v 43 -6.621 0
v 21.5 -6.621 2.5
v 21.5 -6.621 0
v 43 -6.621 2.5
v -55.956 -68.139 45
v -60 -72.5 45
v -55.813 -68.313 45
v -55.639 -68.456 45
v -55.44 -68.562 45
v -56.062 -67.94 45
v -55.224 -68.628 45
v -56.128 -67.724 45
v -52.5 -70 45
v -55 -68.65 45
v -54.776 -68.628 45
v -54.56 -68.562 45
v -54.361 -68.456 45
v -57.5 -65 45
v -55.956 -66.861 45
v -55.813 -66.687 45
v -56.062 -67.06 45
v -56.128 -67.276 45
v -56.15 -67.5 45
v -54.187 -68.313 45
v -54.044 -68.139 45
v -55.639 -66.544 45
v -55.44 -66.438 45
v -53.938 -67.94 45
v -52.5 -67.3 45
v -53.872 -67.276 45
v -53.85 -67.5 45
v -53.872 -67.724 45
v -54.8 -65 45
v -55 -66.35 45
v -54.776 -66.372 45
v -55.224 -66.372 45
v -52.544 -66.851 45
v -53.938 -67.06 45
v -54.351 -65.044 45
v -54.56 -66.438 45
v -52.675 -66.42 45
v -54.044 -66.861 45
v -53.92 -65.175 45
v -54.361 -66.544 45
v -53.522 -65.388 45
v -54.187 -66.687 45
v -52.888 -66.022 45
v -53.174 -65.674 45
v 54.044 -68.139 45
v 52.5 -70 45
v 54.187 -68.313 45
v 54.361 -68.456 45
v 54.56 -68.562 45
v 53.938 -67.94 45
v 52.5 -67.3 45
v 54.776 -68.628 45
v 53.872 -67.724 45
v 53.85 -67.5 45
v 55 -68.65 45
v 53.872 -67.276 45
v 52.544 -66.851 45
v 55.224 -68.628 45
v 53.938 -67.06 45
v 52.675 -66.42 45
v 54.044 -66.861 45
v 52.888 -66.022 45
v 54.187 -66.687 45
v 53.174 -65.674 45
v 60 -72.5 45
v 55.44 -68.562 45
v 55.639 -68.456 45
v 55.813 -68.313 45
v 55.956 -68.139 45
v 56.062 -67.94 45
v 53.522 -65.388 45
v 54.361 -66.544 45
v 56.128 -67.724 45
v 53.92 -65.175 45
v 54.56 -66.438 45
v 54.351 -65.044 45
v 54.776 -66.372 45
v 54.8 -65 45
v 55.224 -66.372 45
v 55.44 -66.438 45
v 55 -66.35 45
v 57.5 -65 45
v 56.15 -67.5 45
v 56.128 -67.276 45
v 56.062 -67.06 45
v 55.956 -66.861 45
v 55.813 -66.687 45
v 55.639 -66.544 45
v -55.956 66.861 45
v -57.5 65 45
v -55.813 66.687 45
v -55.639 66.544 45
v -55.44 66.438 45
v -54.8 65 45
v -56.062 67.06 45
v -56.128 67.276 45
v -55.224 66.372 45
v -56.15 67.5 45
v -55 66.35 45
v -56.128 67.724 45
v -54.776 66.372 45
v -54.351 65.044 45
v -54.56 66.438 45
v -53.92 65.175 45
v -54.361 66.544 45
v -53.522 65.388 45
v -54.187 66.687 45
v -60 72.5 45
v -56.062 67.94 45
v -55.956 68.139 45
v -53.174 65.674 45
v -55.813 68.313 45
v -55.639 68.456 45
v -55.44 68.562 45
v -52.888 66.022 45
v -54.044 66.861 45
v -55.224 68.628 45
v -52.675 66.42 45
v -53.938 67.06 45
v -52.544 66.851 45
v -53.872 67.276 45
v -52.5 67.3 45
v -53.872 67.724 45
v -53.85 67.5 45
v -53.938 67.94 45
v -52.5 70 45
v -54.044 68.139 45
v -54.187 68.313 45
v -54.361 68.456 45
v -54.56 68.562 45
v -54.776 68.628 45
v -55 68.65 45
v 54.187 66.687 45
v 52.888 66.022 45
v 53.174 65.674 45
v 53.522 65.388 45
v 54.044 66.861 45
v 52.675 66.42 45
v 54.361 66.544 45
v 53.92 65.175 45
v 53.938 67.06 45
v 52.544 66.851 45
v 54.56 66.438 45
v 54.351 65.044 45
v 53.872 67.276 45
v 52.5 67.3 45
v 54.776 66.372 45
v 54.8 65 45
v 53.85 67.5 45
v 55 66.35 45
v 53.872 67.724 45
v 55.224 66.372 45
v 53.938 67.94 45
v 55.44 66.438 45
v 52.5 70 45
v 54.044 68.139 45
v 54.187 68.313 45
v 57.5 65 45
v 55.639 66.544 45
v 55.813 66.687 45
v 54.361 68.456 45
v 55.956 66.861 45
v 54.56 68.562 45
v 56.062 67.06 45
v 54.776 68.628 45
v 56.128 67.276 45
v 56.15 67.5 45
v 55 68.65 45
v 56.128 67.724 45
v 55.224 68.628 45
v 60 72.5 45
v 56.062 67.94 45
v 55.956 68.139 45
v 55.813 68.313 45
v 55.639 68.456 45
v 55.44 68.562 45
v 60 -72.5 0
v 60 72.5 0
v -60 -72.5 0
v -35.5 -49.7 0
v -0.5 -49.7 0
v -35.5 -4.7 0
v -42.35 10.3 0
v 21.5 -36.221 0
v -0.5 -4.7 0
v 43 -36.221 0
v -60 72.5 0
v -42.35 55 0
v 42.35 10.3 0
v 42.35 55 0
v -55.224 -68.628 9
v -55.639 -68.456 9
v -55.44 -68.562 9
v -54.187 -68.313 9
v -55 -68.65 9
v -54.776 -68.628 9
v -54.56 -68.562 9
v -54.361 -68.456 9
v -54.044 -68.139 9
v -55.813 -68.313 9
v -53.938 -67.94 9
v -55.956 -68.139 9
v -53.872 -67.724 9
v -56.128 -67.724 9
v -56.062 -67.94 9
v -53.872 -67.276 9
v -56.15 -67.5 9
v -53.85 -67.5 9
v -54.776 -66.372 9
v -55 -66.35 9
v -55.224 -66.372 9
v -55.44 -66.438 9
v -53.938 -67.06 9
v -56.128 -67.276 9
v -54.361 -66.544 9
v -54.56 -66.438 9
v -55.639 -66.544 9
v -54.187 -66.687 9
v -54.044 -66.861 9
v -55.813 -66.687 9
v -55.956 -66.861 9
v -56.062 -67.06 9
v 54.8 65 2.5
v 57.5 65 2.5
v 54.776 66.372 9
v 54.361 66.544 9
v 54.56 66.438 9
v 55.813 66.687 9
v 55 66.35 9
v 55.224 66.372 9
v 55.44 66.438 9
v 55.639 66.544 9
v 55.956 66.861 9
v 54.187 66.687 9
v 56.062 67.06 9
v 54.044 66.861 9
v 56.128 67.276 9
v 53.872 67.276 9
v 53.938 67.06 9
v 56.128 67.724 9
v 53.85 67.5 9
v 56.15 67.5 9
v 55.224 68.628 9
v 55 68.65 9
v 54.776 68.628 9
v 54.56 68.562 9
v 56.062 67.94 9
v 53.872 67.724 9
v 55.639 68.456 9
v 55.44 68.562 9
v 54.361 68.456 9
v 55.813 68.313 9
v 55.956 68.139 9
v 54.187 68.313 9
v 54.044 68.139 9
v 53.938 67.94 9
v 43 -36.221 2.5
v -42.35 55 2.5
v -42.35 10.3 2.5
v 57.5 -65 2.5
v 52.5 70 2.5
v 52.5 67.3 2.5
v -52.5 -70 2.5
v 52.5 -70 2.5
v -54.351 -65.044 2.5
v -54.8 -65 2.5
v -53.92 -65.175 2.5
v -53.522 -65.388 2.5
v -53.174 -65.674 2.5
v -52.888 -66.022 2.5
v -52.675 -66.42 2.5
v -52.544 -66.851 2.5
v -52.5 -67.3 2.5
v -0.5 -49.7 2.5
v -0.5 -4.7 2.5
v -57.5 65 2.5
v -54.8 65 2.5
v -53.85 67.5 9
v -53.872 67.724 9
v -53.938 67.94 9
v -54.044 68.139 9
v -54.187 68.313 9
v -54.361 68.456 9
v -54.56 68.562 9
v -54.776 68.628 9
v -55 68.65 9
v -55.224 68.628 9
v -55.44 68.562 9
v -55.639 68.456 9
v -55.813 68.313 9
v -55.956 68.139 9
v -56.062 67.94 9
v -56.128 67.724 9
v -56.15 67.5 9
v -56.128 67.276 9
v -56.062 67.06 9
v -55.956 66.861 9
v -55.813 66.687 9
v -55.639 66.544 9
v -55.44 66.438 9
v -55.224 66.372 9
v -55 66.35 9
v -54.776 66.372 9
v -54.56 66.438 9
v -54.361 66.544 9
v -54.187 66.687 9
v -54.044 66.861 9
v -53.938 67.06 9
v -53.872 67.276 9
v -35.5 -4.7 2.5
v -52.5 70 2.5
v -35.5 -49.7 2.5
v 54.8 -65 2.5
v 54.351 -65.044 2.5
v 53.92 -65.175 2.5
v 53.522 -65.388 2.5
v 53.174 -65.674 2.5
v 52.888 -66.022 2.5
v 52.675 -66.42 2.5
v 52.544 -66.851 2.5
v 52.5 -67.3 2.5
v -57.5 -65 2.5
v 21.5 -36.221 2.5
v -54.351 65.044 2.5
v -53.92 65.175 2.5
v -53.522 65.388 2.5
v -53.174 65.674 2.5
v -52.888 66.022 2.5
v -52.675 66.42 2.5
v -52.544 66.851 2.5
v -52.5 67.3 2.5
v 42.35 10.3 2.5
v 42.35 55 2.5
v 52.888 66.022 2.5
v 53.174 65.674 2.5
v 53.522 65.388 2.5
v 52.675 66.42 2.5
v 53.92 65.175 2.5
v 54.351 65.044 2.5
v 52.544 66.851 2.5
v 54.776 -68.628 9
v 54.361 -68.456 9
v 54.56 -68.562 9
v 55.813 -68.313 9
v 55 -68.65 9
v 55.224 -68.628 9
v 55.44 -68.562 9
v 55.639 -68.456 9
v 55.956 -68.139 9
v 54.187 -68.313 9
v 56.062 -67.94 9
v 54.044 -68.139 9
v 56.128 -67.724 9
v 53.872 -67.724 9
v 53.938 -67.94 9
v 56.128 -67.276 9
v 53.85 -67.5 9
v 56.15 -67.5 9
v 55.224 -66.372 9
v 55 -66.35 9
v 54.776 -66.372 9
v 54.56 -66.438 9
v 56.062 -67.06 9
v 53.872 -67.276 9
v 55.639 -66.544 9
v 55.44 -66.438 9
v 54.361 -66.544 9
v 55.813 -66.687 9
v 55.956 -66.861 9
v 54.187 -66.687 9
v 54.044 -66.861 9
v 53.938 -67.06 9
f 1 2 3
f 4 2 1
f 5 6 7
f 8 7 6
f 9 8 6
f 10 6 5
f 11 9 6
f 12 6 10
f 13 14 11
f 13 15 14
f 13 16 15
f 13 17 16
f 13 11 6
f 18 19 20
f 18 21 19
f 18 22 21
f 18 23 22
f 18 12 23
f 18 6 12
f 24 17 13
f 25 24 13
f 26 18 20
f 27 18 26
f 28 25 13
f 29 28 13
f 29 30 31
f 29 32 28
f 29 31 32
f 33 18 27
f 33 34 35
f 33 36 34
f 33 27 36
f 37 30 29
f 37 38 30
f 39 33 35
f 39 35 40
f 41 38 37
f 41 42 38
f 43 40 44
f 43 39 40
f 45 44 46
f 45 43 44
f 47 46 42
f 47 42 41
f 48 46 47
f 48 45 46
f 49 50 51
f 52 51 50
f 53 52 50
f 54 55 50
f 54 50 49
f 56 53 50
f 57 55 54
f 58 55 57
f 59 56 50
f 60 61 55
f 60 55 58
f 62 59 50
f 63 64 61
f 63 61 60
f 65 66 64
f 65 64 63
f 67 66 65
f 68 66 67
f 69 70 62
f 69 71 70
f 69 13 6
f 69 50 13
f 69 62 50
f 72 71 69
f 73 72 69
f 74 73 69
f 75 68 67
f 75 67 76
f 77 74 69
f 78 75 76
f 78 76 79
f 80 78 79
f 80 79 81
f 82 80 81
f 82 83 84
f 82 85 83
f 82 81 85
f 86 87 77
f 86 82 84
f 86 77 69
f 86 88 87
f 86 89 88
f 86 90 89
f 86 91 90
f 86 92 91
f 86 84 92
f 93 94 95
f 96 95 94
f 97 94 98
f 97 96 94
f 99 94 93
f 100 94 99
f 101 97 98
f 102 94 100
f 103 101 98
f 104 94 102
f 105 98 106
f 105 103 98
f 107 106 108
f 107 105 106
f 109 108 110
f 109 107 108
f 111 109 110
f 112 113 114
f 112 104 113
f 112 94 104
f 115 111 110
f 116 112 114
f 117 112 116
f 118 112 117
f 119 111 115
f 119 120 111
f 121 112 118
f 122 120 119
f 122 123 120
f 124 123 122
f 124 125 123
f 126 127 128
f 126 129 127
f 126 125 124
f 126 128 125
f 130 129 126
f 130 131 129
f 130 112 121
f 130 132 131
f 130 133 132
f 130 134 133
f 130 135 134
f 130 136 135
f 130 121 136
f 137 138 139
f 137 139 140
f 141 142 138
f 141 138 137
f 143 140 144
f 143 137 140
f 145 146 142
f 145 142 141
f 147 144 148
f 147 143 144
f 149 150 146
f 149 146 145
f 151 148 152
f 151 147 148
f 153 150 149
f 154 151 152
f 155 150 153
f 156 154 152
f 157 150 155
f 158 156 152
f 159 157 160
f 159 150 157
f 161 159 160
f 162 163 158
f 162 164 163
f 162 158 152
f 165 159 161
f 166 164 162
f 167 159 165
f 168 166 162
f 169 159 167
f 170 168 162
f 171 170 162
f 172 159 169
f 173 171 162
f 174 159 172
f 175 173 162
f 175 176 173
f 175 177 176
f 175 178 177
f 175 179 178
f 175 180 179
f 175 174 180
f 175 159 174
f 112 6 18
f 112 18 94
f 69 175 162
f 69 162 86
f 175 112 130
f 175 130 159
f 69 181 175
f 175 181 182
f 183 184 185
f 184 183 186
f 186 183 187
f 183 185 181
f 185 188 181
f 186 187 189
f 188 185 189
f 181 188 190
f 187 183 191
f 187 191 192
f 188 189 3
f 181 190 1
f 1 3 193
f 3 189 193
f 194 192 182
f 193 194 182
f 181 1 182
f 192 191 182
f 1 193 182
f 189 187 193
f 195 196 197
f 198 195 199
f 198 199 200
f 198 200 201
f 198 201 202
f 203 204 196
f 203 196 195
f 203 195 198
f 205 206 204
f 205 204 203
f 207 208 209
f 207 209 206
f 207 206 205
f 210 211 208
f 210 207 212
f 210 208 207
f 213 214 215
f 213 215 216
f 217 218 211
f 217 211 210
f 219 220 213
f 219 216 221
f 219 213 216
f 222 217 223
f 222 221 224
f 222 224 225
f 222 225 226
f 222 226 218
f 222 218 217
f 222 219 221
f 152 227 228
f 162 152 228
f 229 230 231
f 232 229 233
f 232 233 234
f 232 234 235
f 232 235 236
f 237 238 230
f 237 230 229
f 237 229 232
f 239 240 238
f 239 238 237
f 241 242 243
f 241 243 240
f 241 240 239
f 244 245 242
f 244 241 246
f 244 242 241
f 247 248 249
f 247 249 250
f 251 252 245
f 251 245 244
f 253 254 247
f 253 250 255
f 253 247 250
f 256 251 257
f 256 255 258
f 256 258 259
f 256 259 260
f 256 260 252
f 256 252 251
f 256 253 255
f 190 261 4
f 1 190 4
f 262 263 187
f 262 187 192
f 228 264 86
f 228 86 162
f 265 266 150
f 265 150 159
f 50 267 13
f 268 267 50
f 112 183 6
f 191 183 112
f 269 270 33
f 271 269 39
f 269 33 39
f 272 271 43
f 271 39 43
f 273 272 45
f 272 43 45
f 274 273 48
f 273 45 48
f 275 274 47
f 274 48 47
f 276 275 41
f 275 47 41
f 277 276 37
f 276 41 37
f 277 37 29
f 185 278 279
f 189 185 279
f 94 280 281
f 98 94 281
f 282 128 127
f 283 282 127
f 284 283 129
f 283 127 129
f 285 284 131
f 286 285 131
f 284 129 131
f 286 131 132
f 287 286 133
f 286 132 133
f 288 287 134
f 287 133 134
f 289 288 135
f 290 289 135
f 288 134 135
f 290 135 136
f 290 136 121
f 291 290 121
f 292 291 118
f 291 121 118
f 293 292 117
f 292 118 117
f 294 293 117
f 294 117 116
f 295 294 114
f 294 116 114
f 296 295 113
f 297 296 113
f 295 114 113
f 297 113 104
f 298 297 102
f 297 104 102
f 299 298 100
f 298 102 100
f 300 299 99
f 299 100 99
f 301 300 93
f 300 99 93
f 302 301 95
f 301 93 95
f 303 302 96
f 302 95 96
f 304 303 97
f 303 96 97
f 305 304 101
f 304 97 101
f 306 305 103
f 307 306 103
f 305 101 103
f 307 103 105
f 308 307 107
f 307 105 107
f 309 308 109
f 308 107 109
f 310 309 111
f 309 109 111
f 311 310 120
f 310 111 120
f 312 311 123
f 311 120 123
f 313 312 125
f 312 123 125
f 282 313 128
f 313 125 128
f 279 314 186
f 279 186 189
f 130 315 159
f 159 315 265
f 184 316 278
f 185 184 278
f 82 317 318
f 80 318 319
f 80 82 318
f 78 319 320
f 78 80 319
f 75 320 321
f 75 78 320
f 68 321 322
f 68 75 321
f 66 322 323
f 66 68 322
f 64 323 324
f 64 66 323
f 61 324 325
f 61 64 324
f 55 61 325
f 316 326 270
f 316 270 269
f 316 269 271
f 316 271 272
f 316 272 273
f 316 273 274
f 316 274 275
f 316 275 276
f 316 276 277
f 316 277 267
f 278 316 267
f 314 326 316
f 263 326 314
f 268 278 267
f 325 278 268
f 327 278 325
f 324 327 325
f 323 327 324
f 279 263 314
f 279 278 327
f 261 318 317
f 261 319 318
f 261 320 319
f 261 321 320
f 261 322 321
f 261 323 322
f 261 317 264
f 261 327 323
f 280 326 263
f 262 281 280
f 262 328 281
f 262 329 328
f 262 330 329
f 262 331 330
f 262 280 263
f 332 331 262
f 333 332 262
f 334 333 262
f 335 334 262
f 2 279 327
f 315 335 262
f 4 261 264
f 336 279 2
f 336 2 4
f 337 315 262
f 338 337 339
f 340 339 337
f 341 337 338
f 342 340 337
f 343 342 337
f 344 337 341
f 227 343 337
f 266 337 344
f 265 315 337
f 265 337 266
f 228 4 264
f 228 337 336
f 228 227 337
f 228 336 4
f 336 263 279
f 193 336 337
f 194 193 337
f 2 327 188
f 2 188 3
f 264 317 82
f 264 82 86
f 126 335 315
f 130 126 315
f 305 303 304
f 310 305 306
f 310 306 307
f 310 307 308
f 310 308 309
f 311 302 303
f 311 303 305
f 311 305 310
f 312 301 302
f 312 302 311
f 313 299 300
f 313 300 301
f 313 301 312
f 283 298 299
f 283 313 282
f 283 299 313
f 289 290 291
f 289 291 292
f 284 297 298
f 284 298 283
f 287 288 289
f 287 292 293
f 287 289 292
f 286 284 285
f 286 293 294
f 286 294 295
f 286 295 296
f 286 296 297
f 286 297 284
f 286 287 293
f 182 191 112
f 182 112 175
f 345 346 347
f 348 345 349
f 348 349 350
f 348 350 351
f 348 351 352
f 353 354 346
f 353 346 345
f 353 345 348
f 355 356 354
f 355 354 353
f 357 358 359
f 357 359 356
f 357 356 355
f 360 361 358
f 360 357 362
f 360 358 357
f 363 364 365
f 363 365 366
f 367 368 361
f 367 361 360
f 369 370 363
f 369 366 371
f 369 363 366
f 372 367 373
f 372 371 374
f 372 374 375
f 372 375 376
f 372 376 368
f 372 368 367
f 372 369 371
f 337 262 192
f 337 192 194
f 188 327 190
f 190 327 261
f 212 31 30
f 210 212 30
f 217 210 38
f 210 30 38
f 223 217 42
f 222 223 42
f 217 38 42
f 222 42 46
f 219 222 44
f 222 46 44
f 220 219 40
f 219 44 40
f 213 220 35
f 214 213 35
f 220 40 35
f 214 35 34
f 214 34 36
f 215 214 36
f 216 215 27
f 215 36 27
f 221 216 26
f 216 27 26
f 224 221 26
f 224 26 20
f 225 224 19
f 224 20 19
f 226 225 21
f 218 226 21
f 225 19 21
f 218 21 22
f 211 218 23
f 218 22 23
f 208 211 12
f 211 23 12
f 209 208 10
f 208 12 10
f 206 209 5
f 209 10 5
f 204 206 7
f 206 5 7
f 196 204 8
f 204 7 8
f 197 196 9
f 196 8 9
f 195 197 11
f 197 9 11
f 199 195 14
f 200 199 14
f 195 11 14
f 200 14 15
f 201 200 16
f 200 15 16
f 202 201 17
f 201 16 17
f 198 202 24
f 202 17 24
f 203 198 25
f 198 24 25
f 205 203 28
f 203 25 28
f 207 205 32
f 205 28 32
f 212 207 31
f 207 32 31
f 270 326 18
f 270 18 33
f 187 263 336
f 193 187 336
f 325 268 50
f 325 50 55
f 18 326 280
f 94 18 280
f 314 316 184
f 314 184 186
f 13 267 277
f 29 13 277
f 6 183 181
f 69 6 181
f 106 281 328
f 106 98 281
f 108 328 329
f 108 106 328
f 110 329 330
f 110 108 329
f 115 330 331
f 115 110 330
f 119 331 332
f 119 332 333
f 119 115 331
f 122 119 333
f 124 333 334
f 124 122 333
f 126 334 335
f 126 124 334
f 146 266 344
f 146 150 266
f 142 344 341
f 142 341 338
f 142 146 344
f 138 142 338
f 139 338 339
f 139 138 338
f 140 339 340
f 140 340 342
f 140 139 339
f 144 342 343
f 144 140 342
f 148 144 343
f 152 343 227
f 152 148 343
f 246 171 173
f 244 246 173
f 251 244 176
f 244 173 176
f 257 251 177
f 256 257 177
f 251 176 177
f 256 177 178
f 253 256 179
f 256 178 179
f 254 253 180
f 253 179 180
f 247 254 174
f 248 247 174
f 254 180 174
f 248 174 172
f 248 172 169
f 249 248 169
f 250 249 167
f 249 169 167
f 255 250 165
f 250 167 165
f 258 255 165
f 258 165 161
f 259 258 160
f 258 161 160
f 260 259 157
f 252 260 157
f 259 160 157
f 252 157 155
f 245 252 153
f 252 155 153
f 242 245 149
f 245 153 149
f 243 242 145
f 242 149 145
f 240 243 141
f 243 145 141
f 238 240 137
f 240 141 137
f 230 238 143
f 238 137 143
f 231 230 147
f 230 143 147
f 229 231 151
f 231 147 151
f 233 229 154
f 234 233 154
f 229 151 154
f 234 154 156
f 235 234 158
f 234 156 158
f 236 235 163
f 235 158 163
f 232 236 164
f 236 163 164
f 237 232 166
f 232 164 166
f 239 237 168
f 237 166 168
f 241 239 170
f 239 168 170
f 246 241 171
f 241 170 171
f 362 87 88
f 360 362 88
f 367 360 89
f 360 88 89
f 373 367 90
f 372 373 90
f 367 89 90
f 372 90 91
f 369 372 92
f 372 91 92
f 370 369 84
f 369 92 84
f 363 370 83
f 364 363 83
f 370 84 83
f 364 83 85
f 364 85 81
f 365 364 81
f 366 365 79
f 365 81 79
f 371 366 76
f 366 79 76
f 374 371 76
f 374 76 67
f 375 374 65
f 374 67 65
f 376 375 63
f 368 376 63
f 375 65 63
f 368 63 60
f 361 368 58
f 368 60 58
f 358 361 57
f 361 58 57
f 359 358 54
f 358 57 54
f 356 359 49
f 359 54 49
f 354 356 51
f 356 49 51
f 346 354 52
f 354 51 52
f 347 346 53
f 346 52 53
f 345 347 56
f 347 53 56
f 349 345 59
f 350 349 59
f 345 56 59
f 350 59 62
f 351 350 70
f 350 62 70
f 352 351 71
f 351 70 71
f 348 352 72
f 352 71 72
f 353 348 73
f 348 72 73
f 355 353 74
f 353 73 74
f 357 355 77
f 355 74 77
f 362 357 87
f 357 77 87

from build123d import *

# Parameters (mm, degrees)
F4_W      = 120
F4_H      = 145
F5_DEPTH  = 45
F6_T      = -2.5
F8_W      = 35
F8_H      = 45
F8_W_2    = 21.5
F8_H_2    = 29.6
F7_W      = 84.7
F7_H      = 44.7
F9_DEPTH  = 2.5
F10_W     = 5
F10_H     = 5
F11_DEPTH = 42.5
F12_R     = 1.15
F13_DEPTH = 36
F14_R     = 2.3


with BuildPart() as f5:
    # F4 (on Top) → F5 (new body)
    with BuildSketch(Plane.XY):
        Rectangle(F4_W, F4_H)
    extrude(amount=F5_DEPTH)

    # F6
    f6_openings = [f5.faces().sort_by_distance(p)[0] for p in [
        (0, 0, 45),
    ]]
    offset(amount=F6_T, openings=f6_openings)

    # F8 (on face) + F7 (on face) → F9 (cut)
    with BuildSketch(Plane.XY.offset(2.5)):
        with Locations((-18, -27.2)):
            Rectangle(F8_W, F8_H)
        with Locations((32.25, -21.4211801112)):
            Rectangle(F8_W_2, F8_H_2)
    with BuildSketch(Plane.XY.offset(2.5)):
        with Locations((0, 32.65)):
            Rectangle(F7_W, F7_H)
    extrude(amount=-F9_DEPTH, mode=Mode.SUBTRACT)

    # F10 (on face) → F11 (join)
    with BuildSketch(Plane.XY.offset(2.5)):
        with Locations((-55, 67.5)):
            Rectangle(F10_W, F10_H)
        with Locations((-55, -67.5)):
            Rectangle(F10_W, F10_H)
        with Locations((55, -67.5)):
            Rectangle(F10_W, F10_H)
        with Locations((55, 67.5)):
            Rectangle(F10_W, F10_H)
    extrude(amount=F11_DEPTH)

    # F12 (on face) → F13 (cut)
    with BuildSketch(Plane.XY.offset(45)):
        with Locations((-55, 67.5)):
            Circle(F12_R)
        with Locations((55, 67.5)):
            Circle(F12_R)
        with Locations((55, -67.5)):
            Circle(F12_R)
        with Locations((-55, -67.5)):
            Circle(F12_R)
    extrude(amount=-F13_DEPTH, mode=Mode.SUBTRACT)

    # F14
    f14_edges = [f5.edges().sort_by_distance(p)[0] for p in [
        (-52.5, 65, 23.75),
        (52.5, 65, 23.75),
        (52.5, -65, 23.75),
        (-52.5, -65, 23.75),
    ]]
    fillet(f14_edges, radius=F14_R)


solid = f5.part
